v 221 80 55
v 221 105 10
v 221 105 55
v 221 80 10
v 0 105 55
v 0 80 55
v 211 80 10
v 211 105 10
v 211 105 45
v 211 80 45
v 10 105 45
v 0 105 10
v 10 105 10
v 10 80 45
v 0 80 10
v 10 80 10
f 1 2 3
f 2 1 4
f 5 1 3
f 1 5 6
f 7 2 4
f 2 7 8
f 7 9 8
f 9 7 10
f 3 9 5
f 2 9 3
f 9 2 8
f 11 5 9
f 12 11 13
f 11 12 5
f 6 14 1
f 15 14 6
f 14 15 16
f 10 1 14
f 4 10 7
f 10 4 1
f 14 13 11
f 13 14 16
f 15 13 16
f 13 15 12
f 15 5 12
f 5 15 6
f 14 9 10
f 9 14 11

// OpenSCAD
// 35mm High
// 221mm Long
// 82mm Deep

// Constants
offsetHeight = 10;

// Main Bar Variables
mainBarOffsetX = 0;
mainBarOffsetY = 80;
mainBarOffsetZ = 35 + offsetHeight;
mainBarOffsetC = [mainBarOffsetX,mainBarOffsetY,mainBarOffsetZ];
mainBarX = 221;
mainBarY = 25;
mainBarZ = 10;

// Leg 1 Varibles
leg1X = 10;
leg1Y = mainBarY;
leg1Z = mainBarOffsetZ;
leg1OffsetX = mainBarOffsetX;
leg1OffsetY = mainBarOffsetY;
leg1OffsetZ = 0 + offsetHeight;
leg1OffsetC = [leg1OffsetX,leg1OffsetY,leg1OffsetZ];

// Leg 2 Varibles
leg2X = 10;
leg2Y = mainBarY;
leg2Z = mainBarOffsetZ;
leg2OffsetX = mainBarOffsetX + mainBarX - leg2X;
leg2OffsetY = mainBarOffsetY;
leg2OffsetZ = 0 + offsetHeight;
leg2OffsetC = [leg2OffsetX,leg2OffsetY,leg2OffsetZ];

// Foot 1 Varibles
foot1X = 0;
foot1Y = 0;
foot1Z = 10;
foot1OffsetX = 0;
foot1OffsetY = 0;
foot1OffsetZ = 0;
foot1OffsetC = [foot1OffsetX,foot1OffsetY,foot1OffsetZ];

module mainBar() {
    mainBarC = [mainBarX,mainBarY,mainBarZ];
    cube(mainBarC); 
}

module leg1() {
    leg1C = [leg1X,leg1Y,leg1Z];
    cube(leg1C);
}

module leg2() {
    leg2C = [leg2X,leg2Y,leg2Z];
    cube(leg2C);
}

module foot1() {
    foot1C = [foot1X,foot1Y,foot1Z];
    cube(foot1C);
}

translate(foot1OffsetC) foot1();
translate(leg2OffsetC) leg2();
translate(leg1OffsetC) leg1();
translate(mainBarOffsetC) mainBar();
